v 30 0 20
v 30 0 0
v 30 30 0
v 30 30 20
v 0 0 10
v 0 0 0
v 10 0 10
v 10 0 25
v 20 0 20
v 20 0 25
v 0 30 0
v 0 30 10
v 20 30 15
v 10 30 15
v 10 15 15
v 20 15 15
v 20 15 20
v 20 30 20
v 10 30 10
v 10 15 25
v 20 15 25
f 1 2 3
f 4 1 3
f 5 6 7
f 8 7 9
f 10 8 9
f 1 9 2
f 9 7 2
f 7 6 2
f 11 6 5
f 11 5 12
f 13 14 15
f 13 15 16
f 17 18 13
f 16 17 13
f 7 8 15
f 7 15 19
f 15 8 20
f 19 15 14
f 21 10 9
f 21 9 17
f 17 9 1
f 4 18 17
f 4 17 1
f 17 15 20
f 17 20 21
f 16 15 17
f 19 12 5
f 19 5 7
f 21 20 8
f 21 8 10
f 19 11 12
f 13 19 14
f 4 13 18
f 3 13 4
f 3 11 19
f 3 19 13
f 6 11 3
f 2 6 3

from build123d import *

# Parameters (mm, degrees)
SKETCH1_W           = 30
SKETCH1_H           = 30
BOSS_EXTRUDE1_DEPTH = 25
SKETCH2_W           = 10
SKETCH2_H           = 30
CUT_EXTRUDE1_DEPTH  = 5
SKETCH3_W           = 10
SKETCH3_H           = 30
CUT_EXTRUDE2_DEPTH  = 15
SKETCH4_W           = 10
SKETCH4_H           = 10
CUT_EXTRUDE3_DEPTH  = 15


with BuildPart() as part:
    # Sketch1 → Boss-Extrude1 (new body)
    with BuildSketch(Plane.XY):
        with Locations((15, 15)):
            Rectangle(SKETCH1_W, SKETCH1_H)
    extrude(amount=BOSS_EXTRUDE1_DEPTH)

    # Sketch2 → Cut-Extrude1 (cut)
    with BuildSketch(Plane.XY.offset(25)):
        with Locations((25, 15)):
            Rectangle(SKETCH2_W, SKETCH2_H)
    extrude(amount=-CUT_EXTRUDE1_DEPTH, mode=Mode.SUBTRACT)

    # Sketch3 → Cut-Extrude2 (cut)
    with BuildSketch(Plane.XY.offset(25)):
        with Locations((5, 15)):
            Rectangle(SKETCH3_W, SKETCH3_H)
    extrude(amount=-CUT_EXTRUDE2_DEPTH, mode=Mode.SUBTRACT)

    # Sketch4 → Cut-Extrude3 (cut)
    with BuildSketch(Plane(origin=(0, 30, 0), x_dir=(1, 0, 0), z_dir=(0, 1, 0))):
        with Locations((15, -20)):
            Rectangle(SKETCH4_W, SKETCH4_H)
    extrude(amount=-CUT_EXTRUDE3_DEPTH, mode=Mode.SUBTRACT)


solid = part.part
